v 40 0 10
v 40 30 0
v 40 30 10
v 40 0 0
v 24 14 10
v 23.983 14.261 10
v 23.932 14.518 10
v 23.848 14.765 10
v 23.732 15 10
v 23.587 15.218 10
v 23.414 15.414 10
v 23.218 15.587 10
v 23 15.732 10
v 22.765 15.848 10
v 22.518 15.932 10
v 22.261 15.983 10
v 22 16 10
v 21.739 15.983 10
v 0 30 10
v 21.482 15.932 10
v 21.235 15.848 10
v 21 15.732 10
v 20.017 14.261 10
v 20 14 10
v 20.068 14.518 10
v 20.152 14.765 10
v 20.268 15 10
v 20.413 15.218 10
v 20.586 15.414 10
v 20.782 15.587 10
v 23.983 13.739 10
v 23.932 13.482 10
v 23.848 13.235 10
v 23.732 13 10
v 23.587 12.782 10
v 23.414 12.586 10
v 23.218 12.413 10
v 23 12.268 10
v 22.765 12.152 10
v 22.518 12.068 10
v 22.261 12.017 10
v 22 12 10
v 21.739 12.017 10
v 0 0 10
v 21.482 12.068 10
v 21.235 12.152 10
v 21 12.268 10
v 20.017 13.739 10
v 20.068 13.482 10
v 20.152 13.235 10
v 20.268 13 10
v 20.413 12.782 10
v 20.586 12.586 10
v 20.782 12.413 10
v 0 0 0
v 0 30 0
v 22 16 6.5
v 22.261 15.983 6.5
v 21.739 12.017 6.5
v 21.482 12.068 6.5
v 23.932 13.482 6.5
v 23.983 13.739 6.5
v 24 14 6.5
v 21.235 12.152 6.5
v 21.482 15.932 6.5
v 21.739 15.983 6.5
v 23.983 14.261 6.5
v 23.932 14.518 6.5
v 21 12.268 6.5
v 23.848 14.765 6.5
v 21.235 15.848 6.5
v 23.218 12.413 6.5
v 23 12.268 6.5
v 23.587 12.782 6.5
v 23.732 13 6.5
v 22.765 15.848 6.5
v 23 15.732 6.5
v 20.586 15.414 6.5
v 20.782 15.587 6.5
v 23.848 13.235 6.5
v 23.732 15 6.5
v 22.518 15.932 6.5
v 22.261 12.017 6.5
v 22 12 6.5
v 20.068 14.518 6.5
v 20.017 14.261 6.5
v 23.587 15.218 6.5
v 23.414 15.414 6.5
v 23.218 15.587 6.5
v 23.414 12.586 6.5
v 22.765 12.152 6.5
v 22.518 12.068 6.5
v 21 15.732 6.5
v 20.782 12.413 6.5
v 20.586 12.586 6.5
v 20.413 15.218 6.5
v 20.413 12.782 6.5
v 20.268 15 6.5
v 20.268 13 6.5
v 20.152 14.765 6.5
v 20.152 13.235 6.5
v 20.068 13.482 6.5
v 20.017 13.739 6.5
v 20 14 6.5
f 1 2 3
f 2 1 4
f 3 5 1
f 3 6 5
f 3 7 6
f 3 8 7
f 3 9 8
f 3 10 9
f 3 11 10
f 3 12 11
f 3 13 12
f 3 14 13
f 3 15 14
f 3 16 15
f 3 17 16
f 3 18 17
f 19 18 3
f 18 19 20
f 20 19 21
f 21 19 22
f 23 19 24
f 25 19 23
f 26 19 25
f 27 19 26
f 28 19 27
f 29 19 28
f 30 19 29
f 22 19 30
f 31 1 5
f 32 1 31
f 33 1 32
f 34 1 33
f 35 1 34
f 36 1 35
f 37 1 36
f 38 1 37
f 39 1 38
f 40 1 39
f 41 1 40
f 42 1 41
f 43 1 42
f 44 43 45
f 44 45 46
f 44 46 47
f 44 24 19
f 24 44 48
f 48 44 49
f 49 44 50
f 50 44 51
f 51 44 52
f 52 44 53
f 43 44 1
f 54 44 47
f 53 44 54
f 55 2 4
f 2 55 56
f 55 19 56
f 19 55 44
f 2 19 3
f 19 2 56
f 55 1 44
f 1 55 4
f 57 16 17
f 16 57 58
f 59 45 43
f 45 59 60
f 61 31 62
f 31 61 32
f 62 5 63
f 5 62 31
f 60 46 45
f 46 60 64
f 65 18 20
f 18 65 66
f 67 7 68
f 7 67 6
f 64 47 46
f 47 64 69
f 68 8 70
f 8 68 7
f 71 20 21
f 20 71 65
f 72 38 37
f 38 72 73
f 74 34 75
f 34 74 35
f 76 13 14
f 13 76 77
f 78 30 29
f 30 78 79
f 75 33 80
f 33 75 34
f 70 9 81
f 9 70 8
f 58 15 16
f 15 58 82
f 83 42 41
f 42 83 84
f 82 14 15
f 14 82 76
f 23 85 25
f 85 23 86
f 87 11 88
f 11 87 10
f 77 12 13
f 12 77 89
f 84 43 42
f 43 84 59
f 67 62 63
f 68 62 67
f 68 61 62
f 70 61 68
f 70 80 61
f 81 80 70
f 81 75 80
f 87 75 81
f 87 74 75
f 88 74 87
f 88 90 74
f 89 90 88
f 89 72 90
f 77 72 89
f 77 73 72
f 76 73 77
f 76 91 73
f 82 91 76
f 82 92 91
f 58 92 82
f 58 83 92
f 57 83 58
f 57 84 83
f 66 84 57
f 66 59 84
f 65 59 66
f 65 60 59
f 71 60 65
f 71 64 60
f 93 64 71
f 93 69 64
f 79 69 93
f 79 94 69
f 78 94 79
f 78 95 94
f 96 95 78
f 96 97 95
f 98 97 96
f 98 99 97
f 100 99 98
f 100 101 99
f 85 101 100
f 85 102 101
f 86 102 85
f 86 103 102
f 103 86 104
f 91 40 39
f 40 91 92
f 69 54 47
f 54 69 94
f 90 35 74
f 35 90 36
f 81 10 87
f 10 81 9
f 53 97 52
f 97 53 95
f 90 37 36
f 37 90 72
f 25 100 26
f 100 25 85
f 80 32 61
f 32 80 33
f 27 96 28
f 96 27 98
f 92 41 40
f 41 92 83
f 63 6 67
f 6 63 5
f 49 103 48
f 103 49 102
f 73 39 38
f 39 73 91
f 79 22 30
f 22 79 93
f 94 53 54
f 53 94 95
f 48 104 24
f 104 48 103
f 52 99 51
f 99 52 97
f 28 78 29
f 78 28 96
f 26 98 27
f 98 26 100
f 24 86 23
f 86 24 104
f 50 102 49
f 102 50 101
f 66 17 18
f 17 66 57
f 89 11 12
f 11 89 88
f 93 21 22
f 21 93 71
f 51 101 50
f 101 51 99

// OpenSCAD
// units=mm — generated by scad_emitter.py
// part=unnamed
$fn = 48;

difference() { cube([40, 30, 10]); translate([22, 14, 10.5]) rotate([180, 0, 0]) cylinder(h=4, r=2, $fn=$fn); }
